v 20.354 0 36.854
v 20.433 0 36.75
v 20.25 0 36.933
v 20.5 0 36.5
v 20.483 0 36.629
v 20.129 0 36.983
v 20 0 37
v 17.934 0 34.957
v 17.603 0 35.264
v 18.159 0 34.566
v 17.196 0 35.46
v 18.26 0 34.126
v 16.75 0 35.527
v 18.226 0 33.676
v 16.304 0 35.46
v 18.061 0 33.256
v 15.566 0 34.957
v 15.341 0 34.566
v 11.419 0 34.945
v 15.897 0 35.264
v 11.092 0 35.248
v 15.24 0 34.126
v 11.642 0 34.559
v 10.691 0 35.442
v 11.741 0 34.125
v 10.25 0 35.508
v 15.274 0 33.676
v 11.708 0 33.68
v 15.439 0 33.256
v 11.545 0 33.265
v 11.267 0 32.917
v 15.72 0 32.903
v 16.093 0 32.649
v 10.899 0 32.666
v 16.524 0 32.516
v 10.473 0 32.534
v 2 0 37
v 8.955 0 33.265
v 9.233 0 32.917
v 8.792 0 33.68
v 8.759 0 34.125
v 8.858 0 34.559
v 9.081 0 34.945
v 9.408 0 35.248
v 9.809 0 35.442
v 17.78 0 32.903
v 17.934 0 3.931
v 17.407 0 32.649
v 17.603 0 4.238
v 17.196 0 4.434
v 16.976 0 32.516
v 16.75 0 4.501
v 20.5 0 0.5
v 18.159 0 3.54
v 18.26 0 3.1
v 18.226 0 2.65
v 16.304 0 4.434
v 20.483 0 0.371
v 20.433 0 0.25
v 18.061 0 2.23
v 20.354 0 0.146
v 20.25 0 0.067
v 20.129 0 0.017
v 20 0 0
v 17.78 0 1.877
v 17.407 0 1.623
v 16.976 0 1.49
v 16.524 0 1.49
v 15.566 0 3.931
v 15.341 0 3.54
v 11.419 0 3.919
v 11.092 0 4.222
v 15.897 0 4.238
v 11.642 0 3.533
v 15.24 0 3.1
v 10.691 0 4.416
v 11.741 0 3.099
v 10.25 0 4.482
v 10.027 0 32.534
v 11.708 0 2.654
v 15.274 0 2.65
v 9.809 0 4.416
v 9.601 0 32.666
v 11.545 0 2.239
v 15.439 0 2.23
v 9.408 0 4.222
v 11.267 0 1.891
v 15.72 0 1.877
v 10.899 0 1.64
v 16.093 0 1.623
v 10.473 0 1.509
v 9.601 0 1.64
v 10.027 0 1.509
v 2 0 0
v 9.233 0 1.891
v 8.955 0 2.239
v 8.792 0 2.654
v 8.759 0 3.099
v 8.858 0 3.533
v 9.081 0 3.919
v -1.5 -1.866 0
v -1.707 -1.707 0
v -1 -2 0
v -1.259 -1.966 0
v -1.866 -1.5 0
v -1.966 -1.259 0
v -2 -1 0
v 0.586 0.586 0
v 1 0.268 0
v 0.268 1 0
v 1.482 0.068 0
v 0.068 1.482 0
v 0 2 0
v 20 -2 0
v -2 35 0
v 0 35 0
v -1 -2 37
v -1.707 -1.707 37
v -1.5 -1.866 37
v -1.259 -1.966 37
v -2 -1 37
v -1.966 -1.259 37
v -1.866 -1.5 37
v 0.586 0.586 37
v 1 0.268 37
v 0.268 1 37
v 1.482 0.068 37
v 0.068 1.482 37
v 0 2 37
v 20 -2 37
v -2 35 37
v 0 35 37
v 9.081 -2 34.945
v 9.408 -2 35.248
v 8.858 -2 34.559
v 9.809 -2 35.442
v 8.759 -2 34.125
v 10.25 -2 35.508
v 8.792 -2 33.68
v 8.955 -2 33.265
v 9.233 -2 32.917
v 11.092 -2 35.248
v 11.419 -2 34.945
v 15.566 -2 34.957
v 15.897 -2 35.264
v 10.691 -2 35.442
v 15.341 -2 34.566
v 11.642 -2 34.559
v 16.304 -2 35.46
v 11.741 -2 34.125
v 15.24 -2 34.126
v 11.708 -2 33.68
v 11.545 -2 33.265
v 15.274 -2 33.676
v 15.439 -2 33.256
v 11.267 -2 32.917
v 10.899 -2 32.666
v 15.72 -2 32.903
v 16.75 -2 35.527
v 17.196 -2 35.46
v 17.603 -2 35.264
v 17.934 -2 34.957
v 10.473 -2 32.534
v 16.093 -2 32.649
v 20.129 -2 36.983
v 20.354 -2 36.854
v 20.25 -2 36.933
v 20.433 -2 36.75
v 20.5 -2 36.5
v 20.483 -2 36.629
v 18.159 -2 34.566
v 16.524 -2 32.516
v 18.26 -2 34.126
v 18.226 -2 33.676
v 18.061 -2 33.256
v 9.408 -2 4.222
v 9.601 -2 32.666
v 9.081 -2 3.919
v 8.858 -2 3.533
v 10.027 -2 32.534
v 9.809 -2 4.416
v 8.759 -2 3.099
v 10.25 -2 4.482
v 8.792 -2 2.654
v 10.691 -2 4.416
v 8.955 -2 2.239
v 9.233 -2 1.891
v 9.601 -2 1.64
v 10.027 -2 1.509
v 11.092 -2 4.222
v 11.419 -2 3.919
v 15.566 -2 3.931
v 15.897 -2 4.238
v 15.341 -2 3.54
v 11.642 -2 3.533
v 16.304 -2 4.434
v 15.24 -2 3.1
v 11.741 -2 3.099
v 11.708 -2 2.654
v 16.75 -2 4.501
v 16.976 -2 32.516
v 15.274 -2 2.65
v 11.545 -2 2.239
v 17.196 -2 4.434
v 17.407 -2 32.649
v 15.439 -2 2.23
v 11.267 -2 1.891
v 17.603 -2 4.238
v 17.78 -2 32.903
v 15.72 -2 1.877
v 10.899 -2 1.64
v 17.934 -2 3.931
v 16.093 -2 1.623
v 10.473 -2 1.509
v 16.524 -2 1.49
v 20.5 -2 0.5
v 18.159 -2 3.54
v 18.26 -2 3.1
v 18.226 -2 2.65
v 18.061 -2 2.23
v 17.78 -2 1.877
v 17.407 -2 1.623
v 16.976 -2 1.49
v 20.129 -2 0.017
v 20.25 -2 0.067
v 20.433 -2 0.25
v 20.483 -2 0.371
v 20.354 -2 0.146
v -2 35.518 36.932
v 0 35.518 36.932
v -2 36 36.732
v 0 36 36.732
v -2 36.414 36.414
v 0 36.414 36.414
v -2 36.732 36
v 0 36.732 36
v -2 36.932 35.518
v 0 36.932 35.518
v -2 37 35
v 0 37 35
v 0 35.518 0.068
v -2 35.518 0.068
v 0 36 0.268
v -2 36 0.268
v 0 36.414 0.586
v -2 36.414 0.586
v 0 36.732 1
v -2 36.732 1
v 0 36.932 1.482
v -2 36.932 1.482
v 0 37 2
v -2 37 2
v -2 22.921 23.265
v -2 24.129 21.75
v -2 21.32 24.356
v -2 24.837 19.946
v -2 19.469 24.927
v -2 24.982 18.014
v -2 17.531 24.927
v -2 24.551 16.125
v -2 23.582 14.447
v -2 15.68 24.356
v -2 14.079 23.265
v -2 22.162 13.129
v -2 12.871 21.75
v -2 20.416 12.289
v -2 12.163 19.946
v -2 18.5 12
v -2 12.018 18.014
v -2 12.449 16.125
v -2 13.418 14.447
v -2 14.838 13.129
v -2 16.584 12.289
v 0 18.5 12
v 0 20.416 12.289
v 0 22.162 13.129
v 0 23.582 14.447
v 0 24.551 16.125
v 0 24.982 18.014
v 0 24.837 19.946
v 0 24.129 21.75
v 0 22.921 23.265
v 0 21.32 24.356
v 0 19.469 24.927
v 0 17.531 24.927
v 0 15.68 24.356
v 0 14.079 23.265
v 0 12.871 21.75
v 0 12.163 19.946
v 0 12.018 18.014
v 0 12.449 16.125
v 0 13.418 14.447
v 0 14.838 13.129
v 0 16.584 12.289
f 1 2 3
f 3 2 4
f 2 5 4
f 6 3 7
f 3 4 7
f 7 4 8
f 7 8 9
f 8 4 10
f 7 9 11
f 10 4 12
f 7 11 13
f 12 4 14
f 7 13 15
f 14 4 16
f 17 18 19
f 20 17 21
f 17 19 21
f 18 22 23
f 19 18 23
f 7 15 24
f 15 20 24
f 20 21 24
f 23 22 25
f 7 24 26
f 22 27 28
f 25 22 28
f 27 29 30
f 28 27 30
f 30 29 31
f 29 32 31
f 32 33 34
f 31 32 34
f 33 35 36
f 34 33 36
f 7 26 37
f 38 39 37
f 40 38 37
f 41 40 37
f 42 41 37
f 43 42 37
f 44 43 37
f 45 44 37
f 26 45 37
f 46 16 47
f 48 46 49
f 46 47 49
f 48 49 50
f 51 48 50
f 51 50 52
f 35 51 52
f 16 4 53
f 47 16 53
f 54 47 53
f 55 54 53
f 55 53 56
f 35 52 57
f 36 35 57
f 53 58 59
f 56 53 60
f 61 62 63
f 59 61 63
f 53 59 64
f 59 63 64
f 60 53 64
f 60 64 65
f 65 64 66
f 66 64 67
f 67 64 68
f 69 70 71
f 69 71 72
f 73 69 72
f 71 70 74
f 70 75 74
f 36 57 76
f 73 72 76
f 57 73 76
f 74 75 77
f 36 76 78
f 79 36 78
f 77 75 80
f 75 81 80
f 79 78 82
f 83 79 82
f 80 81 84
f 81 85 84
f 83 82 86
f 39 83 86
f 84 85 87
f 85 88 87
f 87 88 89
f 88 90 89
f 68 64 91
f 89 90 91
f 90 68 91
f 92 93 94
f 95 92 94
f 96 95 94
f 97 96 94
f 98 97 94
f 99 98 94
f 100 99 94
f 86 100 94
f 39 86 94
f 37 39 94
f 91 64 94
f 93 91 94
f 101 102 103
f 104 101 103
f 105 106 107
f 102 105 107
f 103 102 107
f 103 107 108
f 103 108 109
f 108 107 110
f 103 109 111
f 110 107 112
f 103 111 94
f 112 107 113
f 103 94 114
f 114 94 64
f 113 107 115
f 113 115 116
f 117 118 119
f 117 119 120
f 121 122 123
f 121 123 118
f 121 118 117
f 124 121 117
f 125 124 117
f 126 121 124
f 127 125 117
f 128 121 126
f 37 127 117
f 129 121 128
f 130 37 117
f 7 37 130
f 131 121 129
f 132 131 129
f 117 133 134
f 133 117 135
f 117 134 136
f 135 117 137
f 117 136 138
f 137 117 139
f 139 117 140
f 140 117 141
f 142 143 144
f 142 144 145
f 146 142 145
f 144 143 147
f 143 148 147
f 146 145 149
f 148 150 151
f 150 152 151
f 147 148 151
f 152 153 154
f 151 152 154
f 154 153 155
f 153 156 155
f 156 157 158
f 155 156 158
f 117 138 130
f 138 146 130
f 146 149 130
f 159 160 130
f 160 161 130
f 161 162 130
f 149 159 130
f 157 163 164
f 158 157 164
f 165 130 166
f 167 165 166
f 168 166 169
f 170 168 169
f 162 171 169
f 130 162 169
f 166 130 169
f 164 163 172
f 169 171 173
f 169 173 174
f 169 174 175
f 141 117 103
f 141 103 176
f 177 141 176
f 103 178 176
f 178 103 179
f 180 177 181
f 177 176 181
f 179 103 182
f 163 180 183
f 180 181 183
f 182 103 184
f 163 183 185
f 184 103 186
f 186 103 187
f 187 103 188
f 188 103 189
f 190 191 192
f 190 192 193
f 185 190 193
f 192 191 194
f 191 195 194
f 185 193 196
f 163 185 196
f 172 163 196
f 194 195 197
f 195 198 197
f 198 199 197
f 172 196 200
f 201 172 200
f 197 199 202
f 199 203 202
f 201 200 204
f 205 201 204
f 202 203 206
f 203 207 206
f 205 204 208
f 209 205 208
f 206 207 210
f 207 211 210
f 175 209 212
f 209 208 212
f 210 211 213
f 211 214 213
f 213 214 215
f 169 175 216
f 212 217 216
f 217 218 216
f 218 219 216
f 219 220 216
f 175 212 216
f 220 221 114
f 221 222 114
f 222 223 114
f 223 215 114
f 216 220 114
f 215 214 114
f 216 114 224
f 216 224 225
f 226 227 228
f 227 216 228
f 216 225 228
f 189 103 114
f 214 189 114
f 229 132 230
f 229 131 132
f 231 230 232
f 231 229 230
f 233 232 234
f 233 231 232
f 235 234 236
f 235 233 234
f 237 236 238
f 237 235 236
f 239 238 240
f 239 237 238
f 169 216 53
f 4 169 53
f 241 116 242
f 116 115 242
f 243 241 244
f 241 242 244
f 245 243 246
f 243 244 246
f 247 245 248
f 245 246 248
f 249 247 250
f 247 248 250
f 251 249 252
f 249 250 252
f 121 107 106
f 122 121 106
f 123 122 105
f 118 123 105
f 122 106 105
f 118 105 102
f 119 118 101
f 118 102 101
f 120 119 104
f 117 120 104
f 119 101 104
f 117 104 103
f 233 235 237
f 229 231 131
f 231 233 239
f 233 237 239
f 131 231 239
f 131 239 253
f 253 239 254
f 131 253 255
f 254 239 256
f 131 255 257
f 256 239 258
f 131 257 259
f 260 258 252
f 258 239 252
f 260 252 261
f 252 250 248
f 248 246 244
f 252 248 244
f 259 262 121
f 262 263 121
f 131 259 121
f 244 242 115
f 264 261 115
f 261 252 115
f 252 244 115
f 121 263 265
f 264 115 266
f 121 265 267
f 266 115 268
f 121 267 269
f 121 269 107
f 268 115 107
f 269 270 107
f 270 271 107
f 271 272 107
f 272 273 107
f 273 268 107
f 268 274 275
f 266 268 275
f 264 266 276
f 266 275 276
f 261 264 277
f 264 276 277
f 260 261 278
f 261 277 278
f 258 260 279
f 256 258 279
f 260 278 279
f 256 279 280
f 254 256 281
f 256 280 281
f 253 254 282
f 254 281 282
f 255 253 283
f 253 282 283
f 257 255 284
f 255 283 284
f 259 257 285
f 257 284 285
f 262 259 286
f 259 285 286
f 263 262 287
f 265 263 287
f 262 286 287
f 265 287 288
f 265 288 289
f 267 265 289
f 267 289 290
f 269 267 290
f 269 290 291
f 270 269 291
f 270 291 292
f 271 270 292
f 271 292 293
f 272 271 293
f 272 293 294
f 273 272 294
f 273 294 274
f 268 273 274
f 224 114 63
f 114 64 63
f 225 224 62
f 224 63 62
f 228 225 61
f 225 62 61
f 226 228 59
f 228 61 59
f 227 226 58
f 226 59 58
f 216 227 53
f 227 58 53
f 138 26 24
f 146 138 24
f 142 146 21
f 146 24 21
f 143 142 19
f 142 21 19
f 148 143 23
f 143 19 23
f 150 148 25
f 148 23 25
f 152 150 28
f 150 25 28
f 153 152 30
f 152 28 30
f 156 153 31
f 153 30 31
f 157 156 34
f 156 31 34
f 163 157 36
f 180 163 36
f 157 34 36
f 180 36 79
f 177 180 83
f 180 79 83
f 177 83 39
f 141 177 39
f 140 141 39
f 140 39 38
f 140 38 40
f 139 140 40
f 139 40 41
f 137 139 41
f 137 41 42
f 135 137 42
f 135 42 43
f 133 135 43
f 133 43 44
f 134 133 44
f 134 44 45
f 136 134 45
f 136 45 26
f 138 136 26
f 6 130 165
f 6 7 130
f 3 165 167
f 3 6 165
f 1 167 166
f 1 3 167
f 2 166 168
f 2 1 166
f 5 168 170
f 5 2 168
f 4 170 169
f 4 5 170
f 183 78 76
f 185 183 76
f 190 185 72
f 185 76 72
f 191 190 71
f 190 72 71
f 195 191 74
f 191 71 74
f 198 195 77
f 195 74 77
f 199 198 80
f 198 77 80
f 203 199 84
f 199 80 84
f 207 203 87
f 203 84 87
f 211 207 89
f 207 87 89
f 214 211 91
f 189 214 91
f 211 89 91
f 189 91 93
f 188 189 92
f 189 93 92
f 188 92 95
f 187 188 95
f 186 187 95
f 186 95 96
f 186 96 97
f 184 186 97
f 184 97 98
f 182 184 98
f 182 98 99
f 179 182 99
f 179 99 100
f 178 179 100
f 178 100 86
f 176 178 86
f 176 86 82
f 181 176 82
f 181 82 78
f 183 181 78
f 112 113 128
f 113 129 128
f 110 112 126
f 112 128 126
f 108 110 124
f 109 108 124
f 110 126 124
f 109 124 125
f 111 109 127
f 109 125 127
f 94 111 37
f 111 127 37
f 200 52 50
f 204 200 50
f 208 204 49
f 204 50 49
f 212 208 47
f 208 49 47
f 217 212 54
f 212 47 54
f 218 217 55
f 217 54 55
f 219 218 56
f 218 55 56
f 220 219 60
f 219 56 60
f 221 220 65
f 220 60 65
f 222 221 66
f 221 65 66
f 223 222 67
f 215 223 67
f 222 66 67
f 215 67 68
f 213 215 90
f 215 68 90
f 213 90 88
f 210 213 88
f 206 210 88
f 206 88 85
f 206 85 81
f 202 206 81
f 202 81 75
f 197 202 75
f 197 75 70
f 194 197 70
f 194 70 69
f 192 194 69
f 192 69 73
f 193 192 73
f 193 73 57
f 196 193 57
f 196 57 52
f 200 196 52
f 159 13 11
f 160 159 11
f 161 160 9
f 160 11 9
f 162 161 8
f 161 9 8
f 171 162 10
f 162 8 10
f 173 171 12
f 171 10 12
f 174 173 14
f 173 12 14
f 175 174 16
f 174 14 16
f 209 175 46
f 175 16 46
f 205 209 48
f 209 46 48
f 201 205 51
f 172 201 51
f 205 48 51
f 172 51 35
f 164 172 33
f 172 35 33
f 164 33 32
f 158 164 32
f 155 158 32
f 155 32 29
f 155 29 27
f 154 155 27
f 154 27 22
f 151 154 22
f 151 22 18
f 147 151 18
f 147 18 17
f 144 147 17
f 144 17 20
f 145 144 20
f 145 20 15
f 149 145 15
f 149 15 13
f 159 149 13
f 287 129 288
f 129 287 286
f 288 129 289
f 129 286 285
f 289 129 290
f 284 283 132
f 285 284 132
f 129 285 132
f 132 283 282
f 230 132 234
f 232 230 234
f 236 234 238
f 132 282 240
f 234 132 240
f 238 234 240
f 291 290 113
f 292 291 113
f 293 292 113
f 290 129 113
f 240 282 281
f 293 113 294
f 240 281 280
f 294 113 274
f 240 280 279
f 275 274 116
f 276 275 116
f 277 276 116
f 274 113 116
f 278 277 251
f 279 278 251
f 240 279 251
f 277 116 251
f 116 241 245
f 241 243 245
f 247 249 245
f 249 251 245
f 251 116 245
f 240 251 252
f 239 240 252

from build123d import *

# Parameters (mm, degrees)
BOSS_EXTRUDE1_DEPTH = 37
SKETCH2_R           = 6.5
SKETCH2_R_2         = 1.5
CUT_EXTRUDE1_DEPTH  = 10
SKETCH3_R           = 1.513801081
SKETCH3_R_2         = 1.495226131
CUT_EXTRUDE2_DEPTH  = 10
FILLET1_R           = 2
FILLET3_R           = 0.5
SKETCH5_W           = 7.144886566
SKETCH5_H           = 37
BOSS_EXTRUDE3_DEPTH = 2
SKETCH6_R           = 2.342689667
BOSS_EXTRUDE4_DEPTH = 2
FILLET5_R           = 2


with BuildPart() as part:
    # Sketch1 → Boss-Extrude1 (new body)
    with BuildSketch(Plane.XY):
        with BuildLine():
            Line((0, 0), (0, 37))
            Line((0, 37), (-2, 37))
            Line((-2, 37), (-2, -1))
            ThreePointArc((-2, -1), (-1.707106781, -1.707106781), (-1, -2))
            Line((-1, -2), (20.5, -2))
            Line((20.5, -2), (20.5, 0))
            Line((20.5, 0), (0, 0))
        make_face()
    extrude(amount=BOSS_EXTRUDE1_DEPTH)

    # Sketch2 → Cut-Extrude1 (cut)
    with BuildSketch(Plane(origin=(0, 0, 0), x_dir=(0, 0, -1), z_dir=(1, 0, 0))):
        with Locations((-18.5, 18.5)):
            Circle(SKETCH2_R)
        with Locations((-18.5, 9)):
            Circle(SKETCH2_R_2)
    extrude(amount=-CUT_EXTRUDE1_DEPTH, mode=Mode.SUBTRACT)

    # Sketch3 → Cut-Extrude2 (cut)
    with BuildSketch(Plane(origin=(0, 0, 0), x_dir=(1, 0, 0), z_dir=(0, 1, 0))):
        with Locations(Location((16.75, -2.987028894, 0), (0, 0, 270))):
            Circle(SKETCH3_R)
        with Locations(Location((10.25, -2.987028894, 0), (0, 0, 270))):
            Circle(SKETCH3_R_2)
        with Locations(Location((4, -2.987028894, 0), (0, 0, 270))):
            Circle(SKETCH3_R_2)
        with Locations(Location((16.75, -34.012971106, 0), (0, 0, 270))):
            Circle(SKETCH3_R)
        with Locations(Location((10.25, -34.012971106, 0), (0, 0, 270))):
            Circle(SKETCH3_R_2)
        with Locations(Location((4, -34.012971106, 0), (0, 0, 270))):
            Circle(SKETCH3_R_2)
    extrude(amount=-CUT_EXTRUDE2_DEPTH, mode=Mode.SUBTRACT)

    # Fillet1
    fillet1_edges = [part.edges().sort_by_distance(p)[0] for p in [
        (-1, 37, 37),
        (-1, 37, 0),
    ]]
    fillet(fillet1_edges, radius=FILLET1_R)

    # Fillet3
    fillet3_edges = [part.edges().sort_by_distance(p)[0] for p in [
        (20.5, -1, 37),
        (20.5, -1, 0),
    ]]
    fillet(fillet3_edges, radius=FILLET3_R)

    # Sketch5 → Boss-Extrude3 (add)
    with BuildSketch(Plane(origin=(0, 0, 0), x_dir=(1, 0, 0), z_dir=(0, 1, 0))):
        with Locations((3.572443283, -18.5)):
            Rectangle(SKETCH5_W, SKETCH5_H)
    extrude(amount=-BOSS_EXTRUDE3_DEPTH)

    # Sketch6 → Boss-Extrude4 (add)
    with BuildSketch(Plane(origin=(0, 0, 0), x_dir=(0, 0, -1), z_dir=(1, 0, 0))):
        with Locations((-18.5, 9)):
            Circle(SKETCH6_R)
    extrude(amount=-BOSS_EXTRUDE4_DEPTH)

    # Fillet5
    fillet5_edges = [part.edges().sort_by_distance(p)[0] for p in [
        (0, 0, 18.5),
    ]]
    fillet(fillet5_edges, radius=FILLET5_R)


solid = part.part
